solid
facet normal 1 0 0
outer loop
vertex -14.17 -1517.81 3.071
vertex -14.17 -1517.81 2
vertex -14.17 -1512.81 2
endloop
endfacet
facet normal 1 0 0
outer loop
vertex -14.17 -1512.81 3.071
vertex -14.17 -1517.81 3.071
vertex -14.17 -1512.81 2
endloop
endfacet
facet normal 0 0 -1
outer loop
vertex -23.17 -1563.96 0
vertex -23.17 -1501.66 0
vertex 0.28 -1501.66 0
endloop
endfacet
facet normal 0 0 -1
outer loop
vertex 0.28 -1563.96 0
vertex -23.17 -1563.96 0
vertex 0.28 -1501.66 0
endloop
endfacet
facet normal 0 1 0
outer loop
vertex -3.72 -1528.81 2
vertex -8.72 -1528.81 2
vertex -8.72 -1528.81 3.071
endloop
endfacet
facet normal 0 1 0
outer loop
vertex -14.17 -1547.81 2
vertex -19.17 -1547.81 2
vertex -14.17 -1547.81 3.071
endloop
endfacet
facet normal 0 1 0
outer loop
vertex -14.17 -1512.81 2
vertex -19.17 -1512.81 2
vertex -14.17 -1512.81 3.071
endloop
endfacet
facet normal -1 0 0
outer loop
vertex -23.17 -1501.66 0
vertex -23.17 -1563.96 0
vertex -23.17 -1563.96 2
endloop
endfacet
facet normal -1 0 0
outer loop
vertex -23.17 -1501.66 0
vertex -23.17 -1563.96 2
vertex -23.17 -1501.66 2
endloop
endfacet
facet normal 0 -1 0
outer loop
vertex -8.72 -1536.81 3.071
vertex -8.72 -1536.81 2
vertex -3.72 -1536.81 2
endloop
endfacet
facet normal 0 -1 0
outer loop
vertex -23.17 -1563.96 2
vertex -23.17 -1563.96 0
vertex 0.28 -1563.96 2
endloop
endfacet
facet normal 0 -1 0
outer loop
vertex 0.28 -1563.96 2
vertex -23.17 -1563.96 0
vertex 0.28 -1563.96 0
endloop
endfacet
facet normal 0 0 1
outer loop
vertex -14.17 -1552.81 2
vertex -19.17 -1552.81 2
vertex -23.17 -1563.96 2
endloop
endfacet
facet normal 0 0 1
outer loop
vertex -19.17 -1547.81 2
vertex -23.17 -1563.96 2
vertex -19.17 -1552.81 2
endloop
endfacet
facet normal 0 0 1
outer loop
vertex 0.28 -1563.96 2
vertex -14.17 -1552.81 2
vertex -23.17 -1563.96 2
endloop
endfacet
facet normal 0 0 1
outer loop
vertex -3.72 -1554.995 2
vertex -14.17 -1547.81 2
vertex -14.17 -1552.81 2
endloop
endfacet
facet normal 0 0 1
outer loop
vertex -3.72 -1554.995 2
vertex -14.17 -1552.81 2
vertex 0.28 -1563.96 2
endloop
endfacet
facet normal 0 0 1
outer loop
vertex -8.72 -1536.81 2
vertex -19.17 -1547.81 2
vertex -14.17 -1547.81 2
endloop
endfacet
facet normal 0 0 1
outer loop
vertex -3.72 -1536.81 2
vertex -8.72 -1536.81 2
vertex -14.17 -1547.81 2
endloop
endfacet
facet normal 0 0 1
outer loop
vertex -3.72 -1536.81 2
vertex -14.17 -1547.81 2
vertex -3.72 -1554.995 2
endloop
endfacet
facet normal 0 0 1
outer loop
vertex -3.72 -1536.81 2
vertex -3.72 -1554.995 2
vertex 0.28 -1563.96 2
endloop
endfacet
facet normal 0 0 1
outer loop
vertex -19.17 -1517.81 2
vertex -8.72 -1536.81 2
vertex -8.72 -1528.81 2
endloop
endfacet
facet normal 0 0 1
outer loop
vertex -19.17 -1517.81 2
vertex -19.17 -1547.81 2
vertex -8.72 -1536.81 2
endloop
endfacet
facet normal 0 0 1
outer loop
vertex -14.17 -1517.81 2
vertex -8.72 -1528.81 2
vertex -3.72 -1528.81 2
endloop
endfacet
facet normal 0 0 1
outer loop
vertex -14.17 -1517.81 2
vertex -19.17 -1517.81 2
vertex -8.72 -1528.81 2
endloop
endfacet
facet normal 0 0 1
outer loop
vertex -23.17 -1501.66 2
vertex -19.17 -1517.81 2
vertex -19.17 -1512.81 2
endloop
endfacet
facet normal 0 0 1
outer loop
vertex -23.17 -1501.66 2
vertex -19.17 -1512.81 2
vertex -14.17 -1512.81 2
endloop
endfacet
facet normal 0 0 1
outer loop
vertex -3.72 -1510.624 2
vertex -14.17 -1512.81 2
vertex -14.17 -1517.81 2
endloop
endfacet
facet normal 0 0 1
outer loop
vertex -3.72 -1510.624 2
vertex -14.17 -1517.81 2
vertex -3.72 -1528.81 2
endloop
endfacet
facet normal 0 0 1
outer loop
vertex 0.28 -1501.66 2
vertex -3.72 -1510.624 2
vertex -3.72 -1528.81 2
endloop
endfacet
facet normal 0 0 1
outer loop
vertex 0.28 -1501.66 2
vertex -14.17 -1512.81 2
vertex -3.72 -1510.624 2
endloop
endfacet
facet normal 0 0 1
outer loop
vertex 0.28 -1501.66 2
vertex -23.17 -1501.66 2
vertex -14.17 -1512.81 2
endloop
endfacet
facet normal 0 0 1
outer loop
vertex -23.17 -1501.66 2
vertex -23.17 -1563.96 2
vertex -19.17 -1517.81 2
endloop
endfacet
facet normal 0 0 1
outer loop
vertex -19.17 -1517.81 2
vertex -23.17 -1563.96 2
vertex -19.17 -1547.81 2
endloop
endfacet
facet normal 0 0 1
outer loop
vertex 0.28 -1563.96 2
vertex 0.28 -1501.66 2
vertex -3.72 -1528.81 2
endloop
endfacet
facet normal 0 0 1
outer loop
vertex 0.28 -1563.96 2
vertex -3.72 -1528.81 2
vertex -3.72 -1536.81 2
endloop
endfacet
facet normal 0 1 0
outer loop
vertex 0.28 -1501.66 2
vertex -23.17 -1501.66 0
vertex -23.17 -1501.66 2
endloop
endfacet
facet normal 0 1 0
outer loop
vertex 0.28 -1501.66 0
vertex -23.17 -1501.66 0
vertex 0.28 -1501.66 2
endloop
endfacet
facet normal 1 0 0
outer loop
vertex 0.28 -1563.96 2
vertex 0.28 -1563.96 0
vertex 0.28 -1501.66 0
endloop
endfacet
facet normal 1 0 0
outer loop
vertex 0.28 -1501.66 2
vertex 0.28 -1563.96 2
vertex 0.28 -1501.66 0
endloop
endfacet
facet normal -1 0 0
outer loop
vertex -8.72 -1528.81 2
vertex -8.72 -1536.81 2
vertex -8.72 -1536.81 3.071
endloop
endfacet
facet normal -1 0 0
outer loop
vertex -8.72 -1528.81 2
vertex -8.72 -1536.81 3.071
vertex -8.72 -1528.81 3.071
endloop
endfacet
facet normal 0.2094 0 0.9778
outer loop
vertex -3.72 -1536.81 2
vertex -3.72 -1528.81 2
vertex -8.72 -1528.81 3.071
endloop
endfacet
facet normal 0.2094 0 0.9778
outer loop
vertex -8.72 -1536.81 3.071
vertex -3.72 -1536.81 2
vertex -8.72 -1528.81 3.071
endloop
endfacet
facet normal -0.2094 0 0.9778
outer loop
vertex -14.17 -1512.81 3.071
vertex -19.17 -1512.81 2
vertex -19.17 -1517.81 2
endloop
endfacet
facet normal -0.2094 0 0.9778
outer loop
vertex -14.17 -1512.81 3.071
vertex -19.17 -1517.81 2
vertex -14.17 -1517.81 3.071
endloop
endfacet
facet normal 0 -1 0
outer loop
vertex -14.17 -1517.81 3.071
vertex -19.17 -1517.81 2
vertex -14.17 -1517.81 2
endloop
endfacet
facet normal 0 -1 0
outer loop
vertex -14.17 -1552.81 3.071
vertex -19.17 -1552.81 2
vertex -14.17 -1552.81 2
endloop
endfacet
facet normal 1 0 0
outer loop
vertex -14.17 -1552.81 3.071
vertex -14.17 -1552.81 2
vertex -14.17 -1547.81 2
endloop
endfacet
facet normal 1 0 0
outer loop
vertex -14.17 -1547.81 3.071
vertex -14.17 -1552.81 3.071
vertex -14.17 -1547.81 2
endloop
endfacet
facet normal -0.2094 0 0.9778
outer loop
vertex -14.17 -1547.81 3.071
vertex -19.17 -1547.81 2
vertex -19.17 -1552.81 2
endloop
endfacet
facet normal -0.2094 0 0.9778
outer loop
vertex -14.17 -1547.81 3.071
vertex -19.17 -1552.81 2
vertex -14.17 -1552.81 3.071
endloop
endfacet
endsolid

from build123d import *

# Parameters (mm, degrees)
SKETCH_1_W       = 23.45
SKETCH_1_H       = 62.3
EXTRUDE_1_DEPTH  = 2
SKETCH_2_W       = 5
SKETCH_2_H       = 5
SKETCH_2_H_2     = 8
EXTRUDE_2_DEPTH  = 1.5
CHAMFER_1_SIZE   = 1.5
CHAMFER_1_SIZE_2 = 7


with BuildPart() as part:
    # Эскиз1 → Бобышка-Вытянуть1 (new body)
    with BuildSketch(Plane.XY):
        with Locations((-11.445010077, -1532.80950355)):
            Rectangle(SKETCH_1_W, SKETCH_1_H)
    extrude(amount=EXTRUDE_1_DEPTH)

    # Эскиз2 → Бобышка-Вытянуть2 (add)
    with BuildSketch(Plane.XY.offset(2)):
        with Locations((-16.670010077, -1550.30950355)):
            Rectangle(SKETCH_2_W, SKETCH_2_H)
        with Locations((-6.220010077, -1532.80950355)):
            Rectangle(SKETCH_2_W, SKETCH_2_H_2)
        with Locations((-16.670010077, -1515.30950355)):
            Rectangle(SKETCH_2_W, SKETCH_2_H)
    extrude(amount=EXTRUDE_2_DEPTH)

    # Фаска1
    # the kernel refuses this chamfer: 7, 1.5 mm, written as the material it takes off along each edge
    with BuildSketch(Plane(origin=(-19.170010077, -1494.624450371, 3.5), x_dir=(-0.1730043027235695, 0, -0.9849210685324644), z_dir=(0, -1, 0))) as chamfer_1_piece_1_section:
        Polygon((CHAMFER_1_SIZE * 0.984921068532, CHAMFER_1_SIZE * 0.173004302724), (-CHAMFER_1_SIZE_2 * 0.173004302724, CHAMFER_1_SIZE_2 * 0.984921068532), (0, 0), align=None)
    chamfer_1_piece_1 = extrude(amount=41.370106359, mode=Mode.PRIVATE)
    chamfer_1_piece_1 = split(chamfer_1_piece_1, bisect_by=Plane(origin=(-16.689828283, -1515.30950355, 2), z_dir=(0, 0, 1)), keep=Keep.TOP, mode=Mode.PRIVATE)
    add(chamfer_1_piece_1, mode=Mode.SUBTRACT)
    with BuildSketch(Plane(origin=(-3.720010077, -1510.624450371, 3.5), x_dir=(0.17300430272357034, 0, -0.9849210685324644), z_dir=(0, -1, 0))) as chamfer_1_piece_2_section:
        Polygon((CHAMFER_1_SIZE * 0.984921068532, -CHAMFER_1_SIZE * 0.173004302724), (-CHAMFER_1_SIZE_2 * 0.173004302724, -CHAMFER_1_SIZE_2 * 0.984921068532), (0, 0), align=None)
    chamfer_1_piece_2 = extrude(amount=44.370106359, mode=Mode.PRIVATE)
    chamfer_1_piece_2 = split(chamfer_1_piece_2, bisect_by=Plane(origin=(-6.200191872, -1532.80950355, 2), z_dir=(0, 0, 1)), keep=Keep.TOP, mode=Mode.PRIVATE)
    add(chamfer_1_piece_2, mode=Mode.SUBTRACT)
    with BuildSketch(Plane(origin=(-19.170010077, -1529.624450371, 3.5), x_dir=(-0.1730043027235695, 0, -0.9849210685324644), z_dir=(0, -1, 0))) as chamfer_1_piece_3_section:
        Polygon((CHAMFER_1_SIZE * 0.984921068532, CHAMFER_1_SIZE * 0.173004302724), (-CHAMFER_1_SIZE_2 * 0.173004302724, CHAMFER_1_SIZE_2 * 0.984921068532), (0, 0), align=None)
    chamfer_1_piece_3 = extrude(amount=41.370106359, mode=Mode.PRIVATE)
    chamfer_1_piece_3 = split(chamfer_1_piece_3, bisect_by=Plane(origin=(-16.689828283, -1550.30950355, 2), z_dir=(0, 0, 1)), keep=Keep.TOP, mode=Mode.PRIVATE)
    add(chamfer_1_piece_3, mode=Mode.SUBTRACT)


solid = part.part
